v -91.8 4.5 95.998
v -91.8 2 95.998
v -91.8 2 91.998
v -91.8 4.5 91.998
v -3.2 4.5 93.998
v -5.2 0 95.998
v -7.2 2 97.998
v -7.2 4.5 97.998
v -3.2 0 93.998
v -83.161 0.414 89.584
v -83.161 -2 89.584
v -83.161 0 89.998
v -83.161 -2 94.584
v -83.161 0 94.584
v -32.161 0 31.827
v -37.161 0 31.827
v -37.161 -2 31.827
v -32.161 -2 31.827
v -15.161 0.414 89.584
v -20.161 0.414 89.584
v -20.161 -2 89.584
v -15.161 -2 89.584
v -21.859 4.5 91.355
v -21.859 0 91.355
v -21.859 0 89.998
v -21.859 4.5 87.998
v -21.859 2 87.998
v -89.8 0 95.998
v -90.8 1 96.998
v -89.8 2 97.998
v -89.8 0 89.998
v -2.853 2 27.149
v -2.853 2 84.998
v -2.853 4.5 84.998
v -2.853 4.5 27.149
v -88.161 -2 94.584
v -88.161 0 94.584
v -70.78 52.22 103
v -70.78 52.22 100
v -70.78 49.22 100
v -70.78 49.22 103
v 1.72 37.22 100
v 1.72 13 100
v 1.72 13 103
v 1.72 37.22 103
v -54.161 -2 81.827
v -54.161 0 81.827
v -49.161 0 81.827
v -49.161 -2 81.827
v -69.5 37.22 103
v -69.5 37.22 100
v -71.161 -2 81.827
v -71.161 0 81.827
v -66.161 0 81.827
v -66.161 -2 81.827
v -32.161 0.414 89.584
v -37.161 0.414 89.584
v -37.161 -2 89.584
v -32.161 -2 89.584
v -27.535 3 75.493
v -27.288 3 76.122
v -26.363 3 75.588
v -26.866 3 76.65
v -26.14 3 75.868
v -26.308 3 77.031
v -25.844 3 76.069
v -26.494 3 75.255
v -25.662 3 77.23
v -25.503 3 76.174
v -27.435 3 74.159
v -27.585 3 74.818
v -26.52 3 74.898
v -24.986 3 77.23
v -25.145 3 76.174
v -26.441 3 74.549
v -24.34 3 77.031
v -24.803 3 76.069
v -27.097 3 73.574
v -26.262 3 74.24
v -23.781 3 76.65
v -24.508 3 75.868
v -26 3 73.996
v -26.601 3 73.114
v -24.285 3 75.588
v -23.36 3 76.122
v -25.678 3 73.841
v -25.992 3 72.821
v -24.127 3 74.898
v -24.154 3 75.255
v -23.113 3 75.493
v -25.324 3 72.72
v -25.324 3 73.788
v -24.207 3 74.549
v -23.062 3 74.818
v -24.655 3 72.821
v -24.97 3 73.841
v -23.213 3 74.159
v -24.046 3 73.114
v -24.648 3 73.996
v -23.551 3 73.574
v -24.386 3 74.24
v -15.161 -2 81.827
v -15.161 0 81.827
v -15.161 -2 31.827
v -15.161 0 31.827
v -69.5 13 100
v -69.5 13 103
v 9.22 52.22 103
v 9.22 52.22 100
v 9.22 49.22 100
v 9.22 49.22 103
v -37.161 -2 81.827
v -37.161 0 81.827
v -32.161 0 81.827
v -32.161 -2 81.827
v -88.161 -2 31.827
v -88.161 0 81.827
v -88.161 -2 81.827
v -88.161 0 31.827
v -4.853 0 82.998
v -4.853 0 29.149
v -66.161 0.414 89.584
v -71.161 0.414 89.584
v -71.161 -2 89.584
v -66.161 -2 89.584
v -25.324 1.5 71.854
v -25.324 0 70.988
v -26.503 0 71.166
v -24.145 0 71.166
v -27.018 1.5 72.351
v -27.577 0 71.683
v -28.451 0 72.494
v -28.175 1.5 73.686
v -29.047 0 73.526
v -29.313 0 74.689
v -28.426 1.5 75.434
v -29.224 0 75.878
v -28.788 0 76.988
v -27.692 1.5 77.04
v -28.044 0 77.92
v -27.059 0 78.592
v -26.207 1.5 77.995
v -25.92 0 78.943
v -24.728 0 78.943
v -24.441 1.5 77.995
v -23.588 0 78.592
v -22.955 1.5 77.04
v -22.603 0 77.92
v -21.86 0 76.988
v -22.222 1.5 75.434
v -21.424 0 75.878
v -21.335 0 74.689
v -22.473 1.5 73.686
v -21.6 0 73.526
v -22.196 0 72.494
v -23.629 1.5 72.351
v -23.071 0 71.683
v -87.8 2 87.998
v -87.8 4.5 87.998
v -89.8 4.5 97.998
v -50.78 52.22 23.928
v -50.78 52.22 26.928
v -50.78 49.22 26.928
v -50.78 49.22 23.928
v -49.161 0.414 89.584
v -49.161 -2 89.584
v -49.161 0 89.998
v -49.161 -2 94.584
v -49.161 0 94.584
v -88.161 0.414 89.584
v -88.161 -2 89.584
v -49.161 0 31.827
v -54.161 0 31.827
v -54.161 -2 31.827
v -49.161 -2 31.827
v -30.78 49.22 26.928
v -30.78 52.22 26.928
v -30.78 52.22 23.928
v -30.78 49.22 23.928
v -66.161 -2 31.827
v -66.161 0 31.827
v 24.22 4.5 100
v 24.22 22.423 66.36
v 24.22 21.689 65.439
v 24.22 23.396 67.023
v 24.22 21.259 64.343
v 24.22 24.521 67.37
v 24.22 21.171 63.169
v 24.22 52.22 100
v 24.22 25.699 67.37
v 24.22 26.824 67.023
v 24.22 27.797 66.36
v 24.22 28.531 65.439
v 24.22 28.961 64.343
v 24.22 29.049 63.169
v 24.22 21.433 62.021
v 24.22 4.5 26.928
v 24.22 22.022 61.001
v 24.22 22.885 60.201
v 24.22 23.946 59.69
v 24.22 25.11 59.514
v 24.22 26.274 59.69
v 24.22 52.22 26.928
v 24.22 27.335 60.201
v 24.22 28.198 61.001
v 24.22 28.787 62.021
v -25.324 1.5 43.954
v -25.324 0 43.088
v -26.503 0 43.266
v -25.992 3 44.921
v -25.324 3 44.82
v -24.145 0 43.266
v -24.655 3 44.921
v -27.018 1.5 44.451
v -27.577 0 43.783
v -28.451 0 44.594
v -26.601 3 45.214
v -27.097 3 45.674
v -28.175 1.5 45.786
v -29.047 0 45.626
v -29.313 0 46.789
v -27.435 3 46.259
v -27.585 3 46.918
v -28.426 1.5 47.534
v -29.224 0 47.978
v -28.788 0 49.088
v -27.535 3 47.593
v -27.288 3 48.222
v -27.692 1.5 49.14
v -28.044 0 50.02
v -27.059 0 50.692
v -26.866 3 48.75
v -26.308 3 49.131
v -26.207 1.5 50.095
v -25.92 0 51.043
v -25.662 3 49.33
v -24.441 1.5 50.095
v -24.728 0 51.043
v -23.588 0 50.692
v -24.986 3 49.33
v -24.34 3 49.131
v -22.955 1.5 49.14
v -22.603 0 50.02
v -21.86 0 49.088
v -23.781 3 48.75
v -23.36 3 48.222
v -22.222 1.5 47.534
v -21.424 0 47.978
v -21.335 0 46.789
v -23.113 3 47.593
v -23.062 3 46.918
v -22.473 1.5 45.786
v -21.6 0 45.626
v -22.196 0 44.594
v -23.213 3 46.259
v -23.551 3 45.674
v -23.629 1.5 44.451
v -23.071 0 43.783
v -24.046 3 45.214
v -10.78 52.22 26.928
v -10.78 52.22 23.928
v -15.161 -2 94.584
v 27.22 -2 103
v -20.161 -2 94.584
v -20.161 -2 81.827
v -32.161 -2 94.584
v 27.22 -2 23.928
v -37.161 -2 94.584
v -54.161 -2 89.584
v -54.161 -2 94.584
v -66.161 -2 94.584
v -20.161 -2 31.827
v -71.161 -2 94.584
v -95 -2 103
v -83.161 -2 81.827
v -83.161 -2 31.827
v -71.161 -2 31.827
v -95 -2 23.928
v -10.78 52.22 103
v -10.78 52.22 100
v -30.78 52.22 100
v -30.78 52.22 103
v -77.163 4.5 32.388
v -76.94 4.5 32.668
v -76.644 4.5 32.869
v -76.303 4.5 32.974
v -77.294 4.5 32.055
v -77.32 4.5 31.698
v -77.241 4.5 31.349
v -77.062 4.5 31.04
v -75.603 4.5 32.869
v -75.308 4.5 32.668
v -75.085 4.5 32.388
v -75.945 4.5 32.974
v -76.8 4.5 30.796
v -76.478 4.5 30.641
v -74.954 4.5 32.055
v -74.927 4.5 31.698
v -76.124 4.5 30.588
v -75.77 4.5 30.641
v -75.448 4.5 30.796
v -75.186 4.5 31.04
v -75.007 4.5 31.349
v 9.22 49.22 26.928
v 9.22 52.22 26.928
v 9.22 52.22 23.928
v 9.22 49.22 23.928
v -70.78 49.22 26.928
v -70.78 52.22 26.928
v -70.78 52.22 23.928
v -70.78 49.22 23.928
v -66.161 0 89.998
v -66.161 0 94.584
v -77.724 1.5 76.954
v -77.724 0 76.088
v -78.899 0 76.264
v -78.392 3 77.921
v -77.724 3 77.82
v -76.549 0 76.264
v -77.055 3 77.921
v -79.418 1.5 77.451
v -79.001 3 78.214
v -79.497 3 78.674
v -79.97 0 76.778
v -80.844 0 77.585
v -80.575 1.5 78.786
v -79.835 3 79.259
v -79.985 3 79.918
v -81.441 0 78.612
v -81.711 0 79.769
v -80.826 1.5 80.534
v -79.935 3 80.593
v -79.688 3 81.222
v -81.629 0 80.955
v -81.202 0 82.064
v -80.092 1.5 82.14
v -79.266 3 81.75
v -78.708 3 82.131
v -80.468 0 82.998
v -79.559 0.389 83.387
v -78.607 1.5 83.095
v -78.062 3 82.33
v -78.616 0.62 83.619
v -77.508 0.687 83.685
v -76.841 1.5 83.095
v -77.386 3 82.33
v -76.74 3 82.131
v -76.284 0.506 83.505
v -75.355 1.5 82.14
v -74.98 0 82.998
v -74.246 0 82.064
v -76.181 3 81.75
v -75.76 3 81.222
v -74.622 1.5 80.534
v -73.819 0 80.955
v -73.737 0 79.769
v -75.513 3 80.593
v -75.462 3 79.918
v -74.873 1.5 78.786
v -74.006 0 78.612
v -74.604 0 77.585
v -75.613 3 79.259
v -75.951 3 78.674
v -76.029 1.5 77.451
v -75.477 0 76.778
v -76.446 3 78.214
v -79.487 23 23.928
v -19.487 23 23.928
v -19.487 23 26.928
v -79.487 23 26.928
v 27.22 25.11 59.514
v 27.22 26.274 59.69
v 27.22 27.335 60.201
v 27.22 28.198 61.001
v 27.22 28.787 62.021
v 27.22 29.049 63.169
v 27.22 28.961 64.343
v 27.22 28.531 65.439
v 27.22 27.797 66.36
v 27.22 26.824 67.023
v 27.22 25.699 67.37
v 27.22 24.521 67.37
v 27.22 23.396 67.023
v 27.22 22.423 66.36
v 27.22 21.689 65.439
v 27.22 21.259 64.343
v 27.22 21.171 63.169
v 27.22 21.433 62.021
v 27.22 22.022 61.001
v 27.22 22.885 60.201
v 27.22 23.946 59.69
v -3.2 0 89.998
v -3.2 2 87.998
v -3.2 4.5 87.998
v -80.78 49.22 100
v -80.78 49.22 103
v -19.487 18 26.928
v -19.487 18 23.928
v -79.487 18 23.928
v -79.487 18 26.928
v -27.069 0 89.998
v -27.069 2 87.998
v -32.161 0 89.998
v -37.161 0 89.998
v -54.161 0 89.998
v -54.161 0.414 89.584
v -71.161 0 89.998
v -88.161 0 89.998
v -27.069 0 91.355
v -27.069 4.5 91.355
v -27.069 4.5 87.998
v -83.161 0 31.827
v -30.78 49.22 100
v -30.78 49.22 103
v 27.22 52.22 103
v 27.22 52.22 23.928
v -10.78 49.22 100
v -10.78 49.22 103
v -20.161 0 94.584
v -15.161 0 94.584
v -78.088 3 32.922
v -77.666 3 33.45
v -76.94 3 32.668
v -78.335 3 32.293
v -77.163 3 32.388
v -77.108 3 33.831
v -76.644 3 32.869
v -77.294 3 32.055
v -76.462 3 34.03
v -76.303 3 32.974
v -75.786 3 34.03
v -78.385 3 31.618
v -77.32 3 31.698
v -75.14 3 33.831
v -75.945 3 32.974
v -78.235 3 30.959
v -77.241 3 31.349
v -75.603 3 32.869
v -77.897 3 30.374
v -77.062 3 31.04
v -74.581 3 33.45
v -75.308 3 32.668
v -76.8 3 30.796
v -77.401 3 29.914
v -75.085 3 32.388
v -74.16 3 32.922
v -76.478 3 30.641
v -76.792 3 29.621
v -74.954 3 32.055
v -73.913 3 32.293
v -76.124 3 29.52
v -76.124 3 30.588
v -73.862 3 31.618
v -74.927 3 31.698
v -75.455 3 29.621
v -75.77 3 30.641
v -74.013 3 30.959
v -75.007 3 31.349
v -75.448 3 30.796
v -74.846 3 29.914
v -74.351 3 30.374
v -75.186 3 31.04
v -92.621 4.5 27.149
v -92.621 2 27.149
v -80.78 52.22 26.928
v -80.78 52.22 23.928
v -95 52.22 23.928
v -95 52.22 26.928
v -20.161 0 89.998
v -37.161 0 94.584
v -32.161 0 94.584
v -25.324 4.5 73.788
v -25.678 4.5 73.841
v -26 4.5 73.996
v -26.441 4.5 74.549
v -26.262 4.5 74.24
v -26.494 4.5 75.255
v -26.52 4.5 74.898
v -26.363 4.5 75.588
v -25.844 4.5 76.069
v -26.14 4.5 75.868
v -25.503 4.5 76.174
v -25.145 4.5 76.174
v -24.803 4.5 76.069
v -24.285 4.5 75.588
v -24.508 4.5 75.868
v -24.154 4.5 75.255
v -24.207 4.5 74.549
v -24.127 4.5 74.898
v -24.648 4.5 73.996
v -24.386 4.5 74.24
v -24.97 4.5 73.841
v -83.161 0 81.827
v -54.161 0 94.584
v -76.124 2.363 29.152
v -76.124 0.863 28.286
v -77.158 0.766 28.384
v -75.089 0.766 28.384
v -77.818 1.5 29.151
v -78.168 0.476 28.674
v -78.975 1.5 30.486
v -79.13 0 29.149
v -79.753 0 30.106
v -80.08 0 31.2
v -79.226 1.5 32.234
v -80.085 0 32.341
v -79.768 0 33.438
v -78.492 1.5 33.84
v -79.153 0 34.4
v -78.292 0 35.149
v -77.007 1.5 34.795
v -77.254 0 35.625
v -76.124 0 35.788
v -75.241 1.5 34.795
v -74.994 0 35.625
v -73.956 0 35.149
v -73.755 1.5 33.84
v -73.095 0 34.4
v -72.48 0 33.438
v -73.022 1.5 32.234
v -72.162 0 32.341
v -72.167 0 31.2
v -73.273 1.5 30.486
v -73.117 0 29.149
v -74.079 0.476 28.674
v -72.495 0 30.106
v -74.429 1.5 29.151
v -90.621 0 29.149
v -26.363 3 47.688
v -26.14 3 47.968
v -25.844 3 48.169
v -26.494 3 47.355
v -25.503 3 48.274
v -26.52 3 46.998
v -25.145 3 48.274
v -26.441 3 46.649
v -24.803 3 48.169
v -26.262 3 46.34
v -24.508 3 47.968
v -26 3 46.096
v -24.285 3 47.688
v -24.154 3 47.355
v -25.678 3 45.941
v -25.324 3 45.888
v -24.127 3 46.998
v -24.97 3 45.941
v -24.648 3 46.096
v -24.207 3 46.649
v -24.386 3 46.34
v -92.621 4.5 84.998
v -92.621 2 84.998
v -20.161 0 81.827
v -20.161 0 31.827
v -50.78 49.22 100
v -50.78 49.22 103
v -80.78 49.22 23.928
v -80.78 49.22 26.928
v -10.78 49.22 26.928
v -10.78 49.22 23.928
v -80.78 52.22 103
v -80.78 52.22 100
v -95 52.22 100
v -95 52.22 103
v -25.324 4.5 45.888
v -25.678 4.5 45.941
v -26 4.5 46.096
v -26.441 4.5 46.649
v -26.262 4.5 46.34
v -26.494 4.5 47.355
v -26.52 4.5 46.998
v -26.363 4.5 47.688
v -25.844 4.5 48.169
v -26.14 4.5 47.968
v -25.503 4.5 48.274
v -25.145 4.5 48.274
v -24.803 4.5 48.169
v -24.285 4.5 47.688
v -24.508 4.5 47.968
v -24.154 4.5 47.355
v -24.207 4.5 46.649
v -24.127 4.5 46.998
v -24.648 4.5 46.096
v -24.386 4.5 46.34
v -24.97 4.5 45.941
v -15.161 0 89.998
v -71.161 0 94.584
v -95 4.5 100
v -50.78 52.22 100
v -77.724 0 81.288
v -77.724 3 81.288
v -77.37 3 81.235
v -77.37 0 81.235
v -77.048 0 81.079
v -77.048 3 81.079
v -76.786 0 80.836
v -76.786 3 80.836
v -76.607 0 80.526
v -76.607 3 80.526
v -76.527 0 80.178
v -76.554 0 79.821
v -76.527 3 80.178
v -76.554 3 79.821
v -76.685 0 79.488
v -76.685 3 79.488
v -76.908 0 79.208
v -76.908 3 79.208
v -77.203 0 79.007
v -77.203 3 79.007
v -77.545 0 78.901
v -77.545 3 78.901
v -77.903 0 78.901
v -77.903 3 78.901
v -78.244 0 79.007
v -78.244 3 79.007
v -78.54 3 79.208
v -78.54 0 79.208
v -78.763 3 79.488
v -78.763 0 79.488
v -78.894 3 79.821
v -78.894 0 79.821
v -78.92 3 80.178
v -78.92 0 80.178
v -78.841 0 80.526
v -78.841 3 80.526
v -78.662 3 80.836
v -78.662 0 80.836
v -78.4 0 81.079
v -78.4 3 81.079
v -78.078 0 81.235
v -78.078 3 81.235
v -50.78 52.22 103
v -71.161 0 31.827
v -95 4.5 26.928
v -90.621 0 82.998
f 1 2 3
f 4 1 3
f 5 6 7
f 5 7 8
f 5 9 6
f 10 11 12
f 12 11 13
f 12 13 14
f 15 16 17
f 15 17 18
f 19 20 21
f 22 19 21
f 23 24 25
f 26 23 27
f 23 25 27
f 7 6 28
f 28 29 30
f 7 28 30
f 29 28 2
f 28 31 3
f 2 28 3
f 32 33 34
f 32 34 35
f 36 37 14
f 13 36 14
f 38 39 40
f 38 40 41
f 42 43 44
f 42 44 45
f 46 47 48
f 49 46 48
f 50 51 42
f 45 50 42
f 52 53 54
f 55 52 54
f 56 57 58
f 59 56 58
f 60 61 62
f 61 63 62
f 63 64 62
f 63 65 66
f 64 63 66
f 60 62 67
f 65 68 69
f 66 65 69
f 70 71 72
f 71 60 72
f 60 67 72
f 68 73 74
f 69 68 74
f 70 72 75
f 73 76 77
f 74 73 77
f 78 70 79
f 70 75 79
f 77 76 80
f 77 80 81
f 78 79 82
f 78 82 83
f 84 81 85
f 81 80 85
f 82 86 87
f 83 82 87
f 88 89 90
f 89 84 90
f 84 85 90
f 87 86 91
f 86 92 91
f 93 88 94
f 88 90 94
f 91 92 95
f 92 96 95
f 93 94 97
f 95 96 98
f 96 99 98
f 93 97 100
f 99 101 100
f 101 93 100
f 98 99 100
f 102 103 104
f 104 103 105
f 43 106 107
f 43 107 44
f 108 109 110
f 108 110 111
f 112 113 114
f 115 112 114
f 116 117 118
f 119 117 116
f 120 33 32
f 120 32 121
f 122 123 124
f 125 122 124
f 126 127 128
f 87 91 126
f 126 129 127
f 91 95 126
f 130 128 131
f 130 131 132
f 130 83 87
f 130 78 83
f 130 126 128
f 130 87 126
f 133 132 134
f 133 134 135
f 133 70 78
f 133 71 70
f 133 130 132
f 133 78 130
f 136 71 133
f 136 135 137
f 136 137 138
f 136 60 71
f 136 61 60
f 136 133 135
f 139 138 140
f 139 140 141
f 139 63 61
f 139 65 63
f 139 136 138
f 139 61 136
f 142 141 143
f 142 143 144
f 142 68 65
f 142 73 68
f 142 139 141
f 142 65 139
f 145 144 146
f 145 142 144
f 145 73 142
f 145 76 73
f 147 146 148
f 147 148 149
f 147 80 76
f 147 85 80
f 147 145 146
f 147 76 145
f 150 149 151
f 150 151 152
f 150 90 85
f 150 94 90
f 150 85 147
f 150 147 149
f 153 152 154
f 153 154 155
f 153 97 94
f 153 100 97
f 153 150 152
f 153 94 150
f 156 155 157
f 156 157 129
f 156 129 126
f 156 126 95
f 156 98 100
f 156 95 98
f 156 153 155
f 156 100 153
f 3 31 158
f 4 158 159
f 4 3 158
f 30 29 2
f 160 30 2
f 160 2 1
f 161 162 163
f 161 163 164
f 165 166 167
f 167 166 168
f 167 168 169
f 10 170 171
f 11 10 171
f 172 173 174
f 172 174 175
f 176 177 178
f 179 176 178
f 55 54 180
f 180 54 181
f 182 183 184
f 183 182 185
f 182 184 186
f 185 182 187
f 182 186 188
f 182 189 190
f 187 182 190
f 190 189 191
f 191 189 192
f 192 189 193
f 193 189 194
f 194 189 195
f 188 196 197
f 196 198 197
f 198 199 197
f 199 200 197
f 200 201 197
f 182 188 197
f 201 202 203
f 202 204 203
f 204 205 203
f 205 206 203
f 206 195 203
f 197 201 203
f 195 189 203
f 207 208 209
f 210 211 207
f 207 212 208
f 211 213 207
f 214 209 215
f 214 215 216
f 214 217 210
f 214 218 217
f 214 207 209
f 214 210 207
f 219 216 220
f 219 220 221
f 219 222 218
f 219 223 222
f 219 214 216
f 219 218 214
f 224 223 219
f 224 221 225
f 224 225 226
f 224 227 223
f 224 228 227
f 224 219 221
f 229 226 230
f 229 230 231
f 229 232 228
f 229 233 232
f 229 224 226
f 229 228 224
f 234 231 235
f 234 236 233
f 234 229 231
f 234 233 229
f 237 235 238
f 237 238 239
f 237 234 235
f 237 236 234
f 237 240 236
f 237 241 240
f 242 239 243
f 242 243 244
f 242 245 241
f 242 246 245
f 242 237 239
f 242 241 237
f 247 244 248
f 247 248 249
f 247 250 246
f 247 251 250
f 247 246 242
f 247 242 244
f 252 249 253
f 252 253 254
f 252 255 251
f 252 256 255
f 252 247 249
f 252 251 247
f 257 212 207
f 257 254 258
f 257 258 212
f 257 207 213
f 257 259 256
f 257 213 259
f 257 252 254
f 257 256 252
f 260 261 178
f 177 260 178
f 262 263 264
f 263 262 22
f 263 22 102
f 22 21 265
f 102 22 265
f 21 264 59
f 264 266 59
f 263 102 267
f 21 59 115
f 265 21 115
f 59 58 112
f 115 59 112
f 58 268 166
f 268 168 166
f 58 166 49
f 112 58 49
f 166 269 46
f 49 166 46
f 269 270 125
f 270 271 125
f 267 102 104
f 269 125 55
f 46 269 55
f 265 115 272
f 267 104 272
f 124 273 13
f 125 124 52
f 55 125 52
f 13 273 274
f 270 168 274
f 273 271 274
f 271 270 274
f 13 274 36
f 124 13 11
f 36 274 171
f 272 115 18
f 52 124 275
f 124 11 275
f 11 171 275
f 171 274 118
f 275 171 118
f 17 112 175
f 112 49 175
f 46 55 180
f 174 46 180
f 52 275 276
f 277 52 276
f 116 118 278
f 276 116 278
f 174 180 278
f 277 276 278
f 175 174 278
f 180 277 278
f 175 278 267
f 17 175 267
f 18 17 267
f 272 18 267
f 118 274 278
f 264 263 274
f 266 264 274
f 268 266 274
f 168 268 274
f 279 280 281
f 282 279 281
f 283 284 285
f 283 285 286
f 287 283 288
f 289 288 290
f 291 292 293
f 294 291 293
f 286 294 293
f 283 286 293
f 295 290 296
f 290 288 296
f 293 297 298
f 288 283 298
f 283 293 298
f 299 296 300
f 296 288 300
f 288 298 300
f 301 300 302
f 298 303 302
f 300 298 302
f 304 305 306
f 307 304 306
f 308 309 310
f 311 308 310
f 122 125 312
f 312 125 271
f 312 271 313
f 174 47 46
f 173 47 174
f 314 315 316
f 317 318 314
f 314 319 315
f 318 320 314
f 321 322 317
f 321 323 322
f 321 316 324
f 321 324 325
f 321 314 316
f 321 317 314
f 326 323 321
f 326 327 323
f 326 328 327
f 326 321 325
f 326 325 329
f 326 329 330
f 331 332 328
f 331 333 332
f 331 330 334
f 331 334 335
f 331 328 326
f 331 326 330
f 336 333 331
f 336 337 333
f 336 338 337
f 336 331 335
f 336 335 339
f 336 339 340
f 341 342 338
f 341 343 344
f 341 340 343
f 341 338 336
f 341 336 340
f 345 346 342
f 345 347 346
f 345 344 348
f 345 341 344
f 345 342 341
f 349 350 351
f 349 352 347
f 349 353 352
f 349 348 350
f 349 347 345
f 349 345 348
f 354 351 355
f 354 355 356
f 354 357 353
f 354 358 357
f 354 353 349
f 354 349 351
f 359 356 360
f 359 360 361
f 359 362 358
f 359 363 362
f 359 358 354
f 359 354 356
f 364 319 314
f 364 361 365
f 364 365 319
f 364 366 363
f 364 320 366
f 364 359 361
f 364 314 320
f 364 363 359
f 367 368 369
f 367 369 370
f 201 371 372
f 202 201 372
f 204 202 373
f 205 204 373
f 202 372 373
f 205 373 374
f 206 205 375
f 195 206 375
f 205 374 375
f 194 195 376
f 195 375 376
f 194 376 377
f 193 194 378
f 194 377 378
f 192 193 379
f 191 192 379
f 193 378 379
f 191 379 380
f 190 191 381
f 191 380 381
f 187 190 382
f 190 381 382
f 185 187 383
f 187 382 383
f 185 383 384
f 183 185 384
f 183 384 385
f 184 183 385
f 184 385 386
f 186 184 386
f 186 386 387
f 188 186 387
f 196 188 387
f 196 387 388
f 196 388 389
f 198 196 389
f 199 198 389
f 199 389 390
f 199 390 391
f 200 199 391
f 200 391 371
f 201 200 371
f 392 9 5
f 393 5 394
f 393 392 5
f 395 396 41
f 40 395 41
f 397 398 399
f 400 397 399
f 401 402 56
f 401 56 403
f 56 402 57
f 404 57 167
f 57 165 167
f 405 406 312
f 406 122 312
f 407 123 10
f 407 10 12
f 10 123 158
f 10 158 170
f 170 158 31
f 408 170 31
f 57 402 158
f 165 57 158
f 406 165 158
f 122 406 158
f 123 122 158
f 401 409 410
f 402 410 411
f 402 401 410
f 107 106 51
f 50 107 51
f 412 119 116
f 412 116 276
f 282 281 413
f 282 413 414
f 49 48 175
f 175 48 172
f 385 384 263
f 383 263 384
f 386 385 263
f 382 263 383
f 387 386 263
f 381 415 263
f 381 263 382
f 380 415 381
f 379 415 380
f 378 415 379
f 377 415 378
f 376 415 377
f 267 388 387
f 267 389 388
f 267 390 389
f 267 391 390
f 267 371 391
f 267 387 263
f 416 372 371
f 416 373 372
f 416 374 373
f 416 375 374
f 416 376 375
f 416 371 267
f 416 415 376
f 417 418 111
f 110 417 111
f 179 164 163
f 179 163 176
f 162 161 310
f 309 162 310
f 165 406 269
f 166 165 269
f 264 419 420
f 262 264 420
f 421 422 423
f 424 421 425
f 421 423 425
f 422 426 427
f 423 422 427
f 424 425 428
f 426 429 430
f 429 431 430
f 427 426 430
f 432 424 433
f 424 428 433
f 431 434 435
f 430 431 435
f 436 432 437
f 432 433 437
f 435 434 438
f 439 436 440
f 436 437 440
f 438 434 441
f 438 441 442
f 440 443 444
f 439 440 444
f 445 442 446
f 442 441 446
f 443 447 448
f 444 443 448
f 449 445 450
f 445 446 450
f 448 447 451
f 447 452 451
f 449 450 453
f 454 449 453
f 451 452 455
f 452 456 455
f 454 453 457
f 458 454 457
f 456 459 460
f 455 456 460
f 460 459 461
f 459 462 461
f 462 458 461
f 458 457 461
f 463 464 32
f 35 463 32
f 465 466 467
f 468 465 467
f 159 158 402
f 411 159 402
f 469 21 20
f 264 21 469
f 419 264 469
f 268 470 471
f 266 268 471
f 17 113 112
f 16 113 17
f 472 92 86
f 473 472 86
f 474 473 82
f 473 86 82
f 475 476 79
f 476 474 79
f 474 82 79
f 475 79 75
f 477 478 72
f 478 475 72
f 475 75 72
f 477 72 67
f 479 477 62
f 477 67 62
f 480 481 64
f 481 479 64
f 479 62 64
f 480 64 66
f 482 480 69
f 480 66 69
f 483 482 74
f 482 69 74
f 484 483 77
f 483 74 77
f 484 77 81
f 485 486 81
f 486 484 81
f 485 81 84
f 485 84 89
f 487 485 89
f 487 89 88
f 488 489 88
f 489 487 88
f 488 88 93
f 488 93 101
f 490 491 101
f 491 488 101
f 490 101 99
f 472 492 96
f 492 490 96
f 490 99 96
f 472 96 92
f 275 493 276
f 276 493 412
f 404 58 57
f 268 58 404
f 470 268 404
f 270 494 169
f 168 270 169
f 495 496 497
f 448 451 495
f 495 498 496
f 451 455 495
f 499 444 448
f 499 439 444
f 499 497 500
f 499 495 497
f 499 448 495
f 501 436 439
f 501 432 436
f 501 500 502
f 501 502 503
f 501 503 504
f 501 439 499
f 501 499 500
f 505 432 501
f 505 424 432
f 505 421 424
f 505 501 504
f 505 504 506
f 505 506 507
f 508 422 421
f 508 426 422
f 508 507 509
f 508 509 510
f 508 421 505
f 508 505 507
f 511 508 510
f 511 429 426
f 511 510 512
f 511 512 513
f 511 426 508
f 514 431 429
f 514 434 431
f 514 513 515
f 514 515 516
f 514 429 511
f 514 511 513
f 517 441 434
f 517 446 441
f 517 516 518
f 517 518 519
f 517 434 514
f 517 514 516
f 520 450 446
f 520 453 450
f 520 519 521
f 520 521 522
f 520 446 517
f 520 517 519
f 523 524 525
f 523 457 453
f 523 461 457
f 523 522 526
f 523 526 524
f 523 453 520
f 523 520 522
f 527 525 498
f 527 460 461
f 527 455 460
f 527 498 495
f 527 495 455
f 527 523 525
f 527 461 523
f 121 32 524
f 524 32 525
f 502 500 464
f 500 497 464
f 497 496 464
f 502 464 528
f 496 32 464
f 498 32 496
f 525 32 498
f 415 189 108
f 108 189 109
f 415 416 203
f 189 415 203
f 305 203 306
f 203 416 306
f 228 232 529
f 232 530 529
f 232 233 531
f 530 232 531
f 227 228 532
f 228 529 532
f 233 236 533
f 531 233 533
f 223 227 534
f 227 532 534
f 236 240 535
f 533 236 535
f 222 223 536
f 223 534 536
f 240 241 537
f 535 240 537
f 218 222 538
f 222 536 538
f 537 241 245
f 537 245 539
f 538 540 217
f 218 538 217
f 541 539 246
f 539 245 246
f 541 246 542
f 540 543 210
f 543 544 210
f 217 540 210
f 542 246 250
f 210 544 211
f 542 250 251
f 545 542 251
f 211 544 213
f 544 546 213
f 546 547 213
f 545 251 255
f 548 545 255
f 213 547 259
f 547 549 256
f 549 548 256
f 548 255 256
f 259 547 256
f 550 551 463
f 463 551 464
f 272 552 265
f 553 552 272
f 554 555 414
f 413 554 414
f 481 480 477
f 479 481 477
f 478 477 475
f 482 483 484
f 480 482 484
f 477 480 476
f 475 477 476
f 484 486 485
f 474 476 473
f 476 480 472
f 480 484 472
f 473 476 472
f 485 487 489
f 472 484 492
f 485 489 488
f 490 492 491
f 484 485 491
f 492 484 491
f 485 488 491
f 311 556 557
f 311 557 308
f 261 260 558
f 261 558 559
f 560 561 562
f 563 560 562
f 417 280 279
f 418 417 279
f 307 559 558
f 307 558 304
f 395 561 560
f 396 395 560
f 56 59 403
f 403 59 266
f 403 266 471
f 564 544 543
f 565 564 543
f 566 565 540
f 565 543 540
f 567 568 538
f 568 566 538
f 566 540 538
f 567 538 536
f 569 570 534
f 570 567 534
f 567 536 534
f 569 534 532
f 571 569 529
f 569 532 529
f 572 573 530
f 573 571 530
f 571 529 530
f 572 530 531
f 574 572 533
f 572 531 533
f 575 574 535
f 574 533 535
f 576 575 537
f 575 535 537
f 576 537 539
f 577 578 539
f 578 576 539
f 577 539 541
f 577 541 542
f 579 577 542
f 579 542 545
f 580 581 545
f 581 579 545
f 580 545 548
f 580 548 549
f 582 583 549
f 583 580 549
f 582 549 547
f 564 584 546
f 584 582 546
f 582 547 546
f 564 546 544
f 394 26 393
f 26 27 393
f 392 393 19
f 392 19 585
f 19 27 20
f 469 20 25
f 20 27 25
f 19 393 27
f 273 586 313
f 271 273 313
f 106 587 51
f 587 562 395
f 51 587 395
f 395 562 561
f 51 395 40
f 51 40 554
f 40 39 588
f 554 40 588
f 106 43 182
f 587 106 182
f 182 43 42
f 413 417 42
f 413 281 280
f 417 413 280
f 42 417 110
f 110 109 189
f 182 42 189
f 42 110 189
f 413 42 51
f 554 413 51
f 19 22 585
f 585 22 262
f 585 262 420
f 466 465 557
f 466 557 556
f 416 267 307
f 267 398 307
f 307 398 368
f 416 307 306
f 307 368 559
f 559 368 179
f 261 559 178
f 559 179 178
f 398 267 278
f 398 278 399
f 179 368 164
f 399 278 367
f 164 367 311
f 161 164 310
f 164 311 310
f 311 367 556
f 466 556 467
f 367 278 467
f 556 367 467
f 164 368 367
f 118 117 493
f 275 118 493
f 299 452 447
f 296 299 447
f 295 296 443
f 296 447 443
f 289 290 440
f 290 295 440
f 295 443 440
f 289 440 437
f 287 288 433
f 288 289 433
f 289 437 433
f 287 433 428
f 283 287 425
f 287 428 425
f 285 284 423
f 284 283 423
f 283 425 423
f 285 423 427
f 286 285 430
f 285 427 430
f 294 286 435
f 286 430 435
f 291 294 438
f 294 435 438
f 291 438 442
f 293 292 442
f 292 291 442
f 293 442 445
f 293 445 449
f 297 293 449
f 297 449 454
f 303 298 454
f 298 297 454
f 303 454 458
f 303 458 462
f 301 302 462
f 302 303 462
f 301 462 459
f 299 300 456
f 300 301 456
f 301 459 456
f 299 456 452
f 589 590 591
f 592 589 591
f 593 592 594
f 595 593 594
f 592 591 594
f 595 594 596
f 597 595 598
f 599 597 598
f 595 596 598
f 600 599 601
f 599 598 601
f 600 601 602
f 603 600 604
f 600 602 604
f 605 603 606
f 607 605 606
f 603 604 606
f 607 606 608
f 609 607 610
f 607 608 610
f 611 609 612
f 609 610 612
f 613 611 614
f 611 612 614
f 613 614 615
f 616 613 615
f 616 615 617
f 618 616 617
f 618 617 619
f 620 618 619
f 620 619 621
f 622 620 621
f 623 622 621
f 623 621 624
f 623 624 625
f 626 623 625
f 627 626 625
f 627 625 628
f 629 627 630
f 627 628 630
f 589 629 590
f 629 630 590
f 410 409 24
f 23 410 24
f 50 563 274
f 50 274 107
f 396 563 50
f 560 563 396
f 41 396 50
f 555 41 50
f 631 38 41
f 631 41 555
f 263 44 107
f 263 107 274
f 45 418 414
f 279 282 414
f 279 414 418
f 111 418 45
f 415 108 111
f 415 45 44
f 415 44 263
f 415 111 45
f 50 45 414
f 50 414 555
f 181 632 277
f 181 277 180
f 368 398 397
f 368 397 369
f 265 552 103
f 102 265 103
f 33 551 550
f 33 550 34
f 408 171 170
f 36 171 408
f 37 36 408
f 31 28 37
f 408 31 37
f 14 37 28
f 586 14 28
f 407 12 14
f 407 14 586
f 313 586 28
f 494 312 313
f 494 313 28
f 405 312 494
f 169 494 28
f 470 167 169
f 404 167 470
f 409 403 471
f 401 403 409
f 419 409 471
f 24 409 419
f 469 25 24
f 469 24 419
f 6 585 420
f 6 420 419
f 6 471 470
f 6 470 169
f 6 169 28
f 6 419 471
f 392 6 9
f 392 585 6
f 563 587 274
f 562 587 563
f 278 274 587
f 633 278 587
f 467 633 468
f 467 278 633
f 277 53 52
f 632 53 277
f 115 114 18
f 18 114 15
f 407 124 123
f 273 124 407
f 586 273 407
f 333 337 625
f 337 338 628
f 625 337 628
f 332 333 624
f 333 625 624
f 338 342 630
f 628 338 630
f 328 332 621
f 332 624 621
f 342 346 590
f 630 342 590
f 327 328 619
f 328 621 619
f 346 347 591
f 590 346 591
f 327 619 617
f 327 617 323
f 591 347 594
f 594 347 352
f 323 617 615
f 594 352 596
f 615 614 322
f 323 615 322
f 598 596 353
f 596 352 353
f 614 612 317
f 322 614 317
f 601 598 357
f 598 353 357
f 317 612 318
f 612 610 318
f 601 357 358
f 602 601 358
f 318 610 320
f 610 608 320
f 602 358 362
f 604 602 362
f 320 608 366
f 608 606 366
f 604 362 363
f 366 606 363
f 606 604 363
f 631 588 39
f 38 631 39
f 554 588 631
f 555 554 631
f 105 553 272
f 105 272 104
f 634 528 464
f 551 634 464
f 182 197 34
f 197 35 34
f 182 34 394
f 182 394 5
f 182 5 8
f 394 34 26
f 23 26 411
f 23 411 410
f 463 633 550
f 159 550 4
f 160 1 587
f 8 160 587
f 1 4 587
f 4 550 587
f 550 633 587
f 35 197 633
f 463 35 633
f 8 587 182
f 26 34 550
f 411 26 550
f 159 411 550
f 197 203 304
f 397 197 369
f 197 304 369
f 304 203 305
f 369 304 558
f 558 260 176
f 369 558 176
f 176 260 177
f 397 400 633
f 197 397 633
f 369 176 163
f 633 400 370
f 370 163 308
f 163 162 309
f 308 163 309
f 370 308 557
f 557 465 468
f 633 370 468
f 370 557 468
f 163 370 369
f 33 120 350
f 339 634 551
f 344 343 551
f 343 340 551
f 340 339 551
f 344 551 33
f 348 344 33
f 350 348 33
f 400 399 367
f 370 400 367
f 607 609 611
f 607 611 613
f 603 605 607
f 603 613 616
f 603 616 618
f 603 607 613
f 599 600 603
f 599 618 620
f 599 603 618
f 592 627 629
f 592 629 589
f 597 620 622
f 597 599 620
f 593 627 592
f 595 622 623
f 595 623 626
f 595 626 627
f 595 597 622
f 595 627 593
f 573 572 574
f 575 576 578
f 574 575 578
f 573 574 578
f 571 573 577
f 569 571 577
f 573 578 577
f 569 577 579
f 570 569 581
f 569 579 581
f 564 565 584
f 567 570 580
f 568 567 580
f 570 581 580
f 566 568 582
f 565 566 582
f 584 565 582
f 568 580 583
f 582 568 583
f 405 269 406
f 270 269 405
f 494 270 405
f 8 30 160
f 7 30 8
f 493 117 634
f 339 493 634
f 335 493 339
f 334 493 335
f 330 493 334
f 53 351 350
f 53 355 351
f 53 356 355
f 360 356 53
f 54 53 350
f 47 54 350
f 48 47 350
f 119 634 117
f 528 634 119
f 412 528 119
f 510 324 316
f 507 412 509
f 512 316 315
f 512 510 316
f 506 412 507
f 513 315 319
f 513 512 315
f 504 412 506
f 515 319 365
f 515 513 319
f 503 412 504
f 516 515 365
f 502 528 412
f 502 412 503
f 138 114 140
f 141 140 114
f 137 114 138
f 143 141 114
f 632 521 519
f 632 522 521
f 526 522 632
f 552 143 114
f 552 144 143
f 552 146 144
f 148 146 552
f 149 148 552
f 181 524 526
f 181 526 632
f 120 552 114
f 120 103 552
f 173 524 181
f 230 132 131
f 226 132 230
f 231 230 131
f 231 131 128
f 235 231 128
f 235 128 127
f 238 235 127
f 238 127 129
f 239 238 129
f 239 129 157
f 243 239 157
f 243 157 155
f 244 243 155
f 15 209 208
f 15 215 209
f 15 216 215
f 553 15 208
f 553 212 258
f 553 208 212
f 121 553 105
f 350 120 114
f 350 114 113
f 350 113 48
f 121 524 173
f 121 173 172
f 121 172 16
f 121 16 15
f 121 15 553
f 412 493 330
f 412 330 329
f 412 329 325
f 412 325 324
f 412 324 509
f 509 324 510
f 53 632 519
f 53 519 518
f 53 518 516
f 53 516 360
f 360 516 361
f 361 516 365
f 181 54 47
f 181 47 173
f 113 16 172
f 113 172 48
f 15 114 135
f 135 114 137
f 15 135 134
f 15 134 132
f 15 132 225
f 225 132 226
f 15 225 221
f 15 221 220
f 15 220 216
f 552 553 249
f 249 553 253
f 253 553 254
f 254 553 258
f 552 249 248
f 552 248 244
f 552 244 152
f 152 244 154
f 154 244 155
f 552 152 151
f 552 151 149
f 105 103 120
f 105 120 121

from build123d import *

# Parameters (mm, degrees)
SKETCH_1_W              = 95
SKETCH_1_H              = 100
EXTRUDE_1_DEPTH         = 2
SKETCH_3_R              = 1.2
EXTRUDE_2_DEPTH         = 7
SKETCH_4_R              = 2
EXTRUDE_3_DEPTH         = 3
CHAMFER_1_SIZE          = 2
CHAMFER_1_SIZE_2        = 3.464101615
SKETCH_5_W              = 88.6
SKETCH_5_H              = 22
SKETCH_5_H_2            = 10
EXTRUDE_4_DEPTH         = 50
SKETCH_8_W              = 2.378668295
SKETCH_8_H              = 57.848959614
SKETCH_8_W_2            = 2.852804632
EXTRUDE_6_DEPTH         = 4.5
SKETCH_7_W              = 5
SKETCH_7_H              = 50
SKETCH_7_H_2            = 9
SKETCH_7_H_3            = 5
CUT_EXTRUDE_1_DEPTH     = 4
CHAMFER_START           = -83.16108201
CHAMFER_2_DEPTH         = 12
CHAMFER_START_2         = -66.16108201
CHAMFER_2_2_DEPTH       = 12
CHAMFER_START_3         = -49.16108201
CHAMFER_2_3_DEPTH       = 12
CHAMFER_START_4         = -32.16108201
CHAMFER_2_4_DEPTH       = 12
CHAMFER_START_5         = -15.16108201
CHAMFER_2_5_DEPTH       = 12.308277378
CHAMFER_START_6         = -92.621331705
CHAMFER_2_6_DEPTH       = 4.460249695
CHAMFER_2_7_DEPTH       = 89.768527073
CHAMFER_START_7         = 1
CHAMFER_2_8_DEPTH       = 86.998233291
CHAMFER_2_9_DEPTH       = 26.149273677
CHAMFER_START_8         = 84.998233291
CHAMFER_2_10_DEPTH      = 14.001766709
SKETCH_13_W             = 5.505876785
SKETCH_13_H             = 3
CUT_EXTRUDE_6_DEPTH     = 10
SKETCH_17_W             = 2
SKETCH_17_H             = 2
SKETCH_17_W_2           = 0.768088879
EXTRUDE_9_DEPTH         = 20
CHAMFER_3_SIZE          = 2
CHAMFER_3_SIZE_2        = 3.464101615
CHAMFER_6_SIZE          = 4
SKETCH_18_W             = 4.206221656
SKETCH_18_H             = 3.021554381
SKETCH_18_W_2           = 5.210107228
SKETCH_18_H_2           = 3.356992826
EXTRUDE_11_DEPTH        = 50
FILLET_2_R              = 2
SKETCH_20_W             = 2.378668295
SKETCH_20_H             = 7.010495323
EXTRUDE_13_DEPTH        = 30
SKETCH_21_W             = 2.378668295
SKETCH_21_H             = 4.566526532
EXTRUDE_14_DEPTH        = 12
SKETCH_22_R             = 1.2
CUT_EXTRUDE_7_DEPTH     = 3
SKETCH_24_W             = 14.181336584
SKETCH_24_H             = 31.500920509
CUT_EXTRUDE_8_DEPTH     = 1
CHAMFER_7_SIZE          = 2
CORTAR_EXTRUIR1_DEPTH   = 147.714007511
CROQUIS4_W              = 122.22
CROQUIS4_H              = 54.22
CROQUIS4_W_2            = 71.22
CROQUIS4_H_2            = 24.22
SALIENTE_EXTRUIR2_DEPTH = 3
CROQUIS5_W              = 100
CROQUIS5_H              = 6.5
SALIENTE_EXTRUIR3_DEPTH = 27.22
CROQUIS10_W             = 122.22
CROQUIS10_H             = 23.928408898
CORTAR_EXTRUIR2_DEPTH   = 149.024316921
SALIENTE_EXTRUIR4_REACH = 170.148
CROQUIS13_W             = 1.988266343
CROQUIS13_H             = 6.5
CROQUIS14_W             = 122.22
CROQUIS14_H             = 54.22
SALIENTE_EXTRUIR5_DEPTH = 3
CROQUIS15_W             = 79.071591102
CROQUIS15_H             = 54.22
SALIENTE_EXTRUIR6_DEPTH = 3
CROQUIS16_R             = 3.95
CORTAR_EXTRUIR3_DEPTH   = 169.147723148
CROQUIS18_W             = 10
CROQUIS18_H             = 3
CROQUIS18_W_2           = 20
CORTAR_EXTRUIR4_DEPTH   = 3
CROQUIS23_W             = 60
CROQUIS23_H             = 5
CORTAR_EXTRUIR5_DEPTH   = 3


with BuildPart() as part:
    # Эскиз1 → Бобышка-Вытянуть1 (new body)
    with BuildSketch(Plane(origin=(0, 0, 0), x_dir=(1, 0, 0), z_dir=(0, 1, 0))):
        with Locations((-47.5, -50)):
            Rectangle(SKETCH_1_W, SKETCH_1_H)
    extrude(amount=-EXTRUDE_1_DEPTH)

    # Эскиз3 → Бобышка-Вытянуть2 (add)
    with BuildSketch(Plane(origin=(0, 0, 0), x_dir=(1, 0, 0), z_dir=(0, 1, 0))):
        with Locations(Location((-76.12379646, -31.787862309, 0), (0, 0, 90))):
            Circle(SKETCH_3_R)
        with Locations(Location((-25.32379646, -47.087862309, 0), (0, 0, 90))):
            Circle(SKETCH_3_R)
        with Locations(Location((-25.32379646, -74.987862309, 0), (0, 0, 90))):
            Circle(SKETCH_3_R)
    extrude(amount=EXTRUDE_2_DEPTH)

    # Эскиз4 → Бобышка-Вытянуть3 (add)
    with BuildSketch(Plane(origin=(0, 0, 0), x_dir=(1, 0, 0), z_dir=(0, 1, 0))):
        with Locations(Location((-76.12379646, -31.787862309, 0), (0, 0, 90))):
            Circle(SKETCH_4_R)
        with Locations(Location((-25.32379646, -47.087862309, 0), (0, 0, 90))):
            Circle(SKETCH_4_R)
        with Locations(Location((-25.32379646, -74.987862309, 0), (0, 0, 90))):
            Circle(SKETCH_4_R)
        with Locations(Location((-77.72379646, -80.087862309, 0), (0, 0, 90))):
            Circle(SKETCH_4_R)
    extrude(amount=EXTRUDE_3_DEPTH)

    # Фаска1
    # the kernel refuses this chamfer: 3.464101615, 2 mm, written as the material it adds along each edge
    with BuildSketch(Plane(origin=(-25.32379646, 0, 47.087862309), x_dir=(0, 0, -1), z_dir=(1, 0, 0))) as chamfer_1_piece_1_section:
        Polygon((2 + CHAMFER_1_SIZE, 0), (2, CHAMFER_1_SIZE_2), (2, 0), align=None)
    chamfer_1_piece_1 = revolve(axis=Axis((-25.32379646, 0, 47.087862309), (0, 1, 0)), mode=Mode.PRIVATE)
    chamfer_1_piece_1 = split(chamfer_1_piece_1, bisect_by=Plane(origin=(-25.32379646, 3, 47.087862309), z_dir=(0, -1, 0)), keep=Keep.TOP, mode=Mode.PRIVATE)
    add(chamfer_1_piece_1)
    with BuildSketch(Plane(origin=(-76.12379646, 0, 31.787862309), x_dir=(0, 0, -1), z_dir=(1, 0, 0))) as chamfer_1_piece_2_section:
        Polygon((2 + CHAMFER_1_SIZE, 0), (2, CHAMFER_1_SIZE_2), (2, 0), align=None)
    chamfer_1_piece_2 = revolve(axis=Axis((-76.12379646, 0, 31.787862309), (0, 1, 0)), mode=Mode.PRIVATE)
    chamfer_1_piece_2 = split(chamfer_1_piece_2, bisect_by=Plane(origin=(-76.12379646, 3, 31.787862309), z_dir=(0, -1, 0)), keep=Keep.TOP, mode=Mode.PRIVATE)
    add(chamfer_1_piece_2)
    with BuildSketch(Plane(origin=(-77.72379646, 0, 80.087862309), x_dir=(0, 0, -1), z_dir=(1, 0, 0))) as chamfer_1_piece_3_section:
        Polygon((2 + CHAMFER_1_SIZE, 0), (2, CHAMFER_1_SIZE_2), (2, 0), align=None)
    chamfer_1_piece_3 = revolve(axis=Axis((-77.72379646, 0, 80.087862309), (0, 1, 0)), mode=Mode.PRIVATE)
    chamfer_1_piece_3 = split(chamfer_1_piece_3, bisect_by=Plane(origin=(-77.72379646, 3, 80.087862309), z_dir=(0, -1, 0)), keep=Keep.TOP, mode=Mode.PRIVATE)
    add(chamfer_1_piece_3)
    with BuildSketch(Plane(origin=(-25.32379646, 0, 74.987862309), x_dir=(0, 0, -1), z_dir=(1, 0, 0))) as chamfer_1_piece_4_section:
        Polygon((2 + CHAMFER_1_SIZE, 0), (2, CHAMFER_1_SIZE_2), (2, 0), align=None)
    chamfer_1_piece_4 = revolve(axis=Axis((-25.32379646, 0, 74.987862309), (0, 1, 0)), mode=Mode.PRIVATE)
    chamfer_1_piece_4 = split(chamfer_1_piece_4, bisect_by=Plane(origin=(-25.32379646, 3, 74.987862309), z_dir=(0, -1, 0)), keep=Keep.TOP, mode=Mode.PRIVATE)
    add(chamfer_1_piece_4)

    # Эскиз5 → Бобышка-Вытянуть4 (add)
    # profile 1 of 2: a face of its own
    with BuildSketch(Plane(origin=(0, 0, 0), x_dir=(1, 0, 0), z_dir=(0, 1, 0))):
        Polygon((0, 0), (-95, 0), (-95, -3), (-95, -24.149273677), (-95, -27.149273677), (0, -27.149273677), (0, -24.149273677), (0, -3), align=None)
        with Locations((-47.5, -13.149273677)):
            Rectangle(SKETCH_5_W, SKETCH_5_H, mode=Mode.SUBTRACT)
    # profile 2 of 2: a face of its own
    with BuildSketch(Plane(origin=(0, 0, 0), x_dir=(1, 0, 0), z_dir=(0, 1, 0))):
        Polygon((0, -100), (-95, -100), (-95, -97), (-95, -87.998233291), (-95, -84.998233291), (0, -84.998233291), (0, -87.998233291), (0, -97), align=None)
        with Locations((-47.5, -92.998233291)):
            Rectangle(SKETCH_5_W, SKETCH_5_H_2, mode=Mode.SUBTRACT)
    extrude(amount=EXTRUDE_4_DEPTH)

    # Эскиз8 → Бобышка-Вытянуть6 (add)
    with BuildSketch(Plane(origin=(0, 0, 0), x_dir=(1, 0, 0), z_dir=(0, 1, 0))):
        with Locations((-93.810665852, -56.073753484)):
            Rectangle(SKETCH_8_W, SKETCH_8_H)
        with Locations((-1.426402316, -56.073753484)):
            Rectangle(SKETCH_8_W_2, SKETCH_8_H)
    extrude(amount=EXTRUDE_6_DEPTH)

    # Эскиз7 → Вырез-Вытянуть1 (cut)
    with BuildSketch(Plane(origin=(0, 0, 0), x_dir=(1, 0, 0), z_dir=(0, 1, 0))):
        with Locations((-68.66108201, -56.826653613)):
            Rectangle(SKETCH_7_W, SKETCH_7_H)
        with Locations((-85.66108201, -56.826653613)):
            Rectangle(SKETCH_7_W, SKETCH_7_H)
        with Locations((-68.66108201, -10.718973477)):
            Rectangle(SKETCH_7_W, SKETCH_7_H_2)
        with Locations((-85.66108201, -10.718973477)):
            Rectangle(SKETCH_7_W, SKETCH_7_H_2)
        with Locations((-85.66108201, -92.084172994)):
            Rectangle(SKETCH_7_W, SKETCH_7_H_3)
        with Locations((-51.66108201, -56.826653613)):
            Rectangle(SKETCH_7_W, SKETCH_7_H)
        with Locations((-34.66108201, -56.826653613)):
            Rectangle(SKETCH_7_W, SKETCH_7_H)
        with Locations((-17.66108201, -56.826653613)):
            Rectangle(SKETCH_7_W, SKETCH_7_H)
        with Locations((-68.66108201, -92.084172994)):
            Rectangle(SKETCH_7_W, SKETCH_7_H_3)
        with Locations((-51.66108201, -10.718973477)):
            Rectangle(SKETCH_7_W, SKETCH_7_H_2)
        with Locations((-51.66108201, -92.084172994)):
            Rectangle(SKETCH_7_W, SKETCH_7_H_3)
        with Locations((-34.66108201, -10.718973477)):
            Rectangle(SKETCH_7_W, SKETCH_7_H_2)
        with Locations((-34.66108201, -92.084172994)):
            Rectangle(SKETCH_7_W, SKETCH_7_H_3)
        with Locations((-17.66108201, -10.718973477)):
            Rectangle(SKETCH_7_W, SKETCH_7_H_2)
        with Locations((-17.66108201, -92.084172994)):
            Rectangle(SKETCH_7_W, SKETCH_7_H_3)
    extrude(amount=-CUT_EXTRUDE_1_DEPTH, mode=Mode.SUBTRACT)

    # Фаска2: read off the stored shape, not the designer's step
    # Фаска2 outline → Фаска2 (add)
    with BuildSketch(Plane.YZ.offset(CHAMFER_START)):
        Polygon((0, 89.998233291), (0, 89.584172994), (0.414060297, 89.584172994), align=None)
    extrude(amount=CHAMFER_2_DEPTH)

    # Chamfer 2 2 outline → Chamfer 2 2 (add)
    with BuildSketch(Plane.YZ.offset(CHAMFER_START_2)):
        Polygon((0, 89.998233291), (0, 89.584172994), (0.414060297, 89.584172994), align=None)
    extrude(amount=CHAMFER_2_2_DEPTH)

    # Chamfer 2 3 outline → Chamfer 2 3 (add)
    with BuildSketch(Plane.YZ.offset(CHAMFER_START_3)):
        Polygon((0, 89.998233291), (0, 89.584172994), (0.414060297, 89.584172994), align=None)
    extrude(amount=CHAMFER_2_3_DEPTH)

    # Chamfer 2 4 outline → Chamfer 2 4 (add)
    with BuildSketch(Plane.YZ.offset(CHAMFER_START_4)):
        Polygon((0, 89.998233291), (0, 89.584172994), (0.414060297, 89.584172994), align=None)
    extrude(amount=CHAMFER_2_4_DEPTH)

    # Chamfer 2 5 outline → Chamfer 2 5 (add)
    with BuildSketch(Plane.YZ.offset(CHAMFER_START_5)):
        Polygon((0, 89.998233291), (0, 89.584172994), (0.414060297, 89.584172994), align=None)
    extrude(amount=CHAMFER_2_5_DEPTH)

    # Chamfer 2 6 outline → Chamfer 2 6 (add)
    with BuildSketch(Plane.YZ.offset(CHAMFER_START_6)):
        Polygon((0, 89.998233291), (0, 89.584172994), (0.414060297, 89.584172994), align=None)
    extrude(amount=CHAMFER_2_6_DEPTH)

    # Chamfer 2 7 outline → Chamfer 2 7 (add)
    with BuildSketch(Plane.YZ.offset(CHAMFER_START_6)):
        Polygon((0, 97.998233291), (0, 95.998233291), (2, 97.998233291), align=None)
        Polygon((0.414060297, 89.584172994), (0, 89.584172994), (0, 87.998233291), (2, 87.998233291), align=None)
        Polygon((0, 24.149273677), (0, 22.149273677), (2, 24.149273677), align=None)
        Polygon((2, 2.149273677), (0, 4.149273677), (0, 2.149273677), align=None)
        Polygon((0, 27.149273677), (2, 27.149273677), (0, 29.149273677), align=None)
        Polygon((0, 84.998233291), (0, 82.998233291), (2, 84.998233291), align=None)
    extrude(amount=CHAMFER_2_7_DEPTH)

    # Chamfer 2 8 outline → Chamfer 2 8 (add)
    with BuildSketch(Plane.XY.offset(CHAMFER_START_7)):
        Polygon((-92.621331705, 0), (-90.621331705, 0), (-92.621331705, 2), align=None)
        Polygon((-4.852804632, 0), (-2.852804632, 0), (-2.852804632, 2), align=None)
    extrude(amount=CHAMFER_2_8_DEPTH)

    # Chamfer 2 9 outline → Chamfer 2 9 (add)
    with BuildSketch(Plane.XY.offset(CHAMFER_START_7)):
        Polygon((-3.2, 2), (-5.2, 0), (-4.852804632, 0), (-3.2, 1.652804632), align=None)
        Polygon((-89.8, 0), (-91.8, 2), (-91.8, 1.178668295), (-90.621331705, 0), align=None)
    extrude(amount=CHAMFER_2_9_DEPTH)

    # Chamfer 2 10 outline → Chamfer 2 10 (add)
    with BuildSketch(Plane.XY.offset(CHAMFER_START_8)):
        Polygon((-89.8, 0), (-91.8, 2), (-91.8, 0), align=None)
    extrude(amount=CHAMFER_2_10_DEPTH)

    # Эскиз13 → Вырез-Вытянуть6 (cut)
    with BuildSketch(Plane(origin=(0, 50, 0), x_dir=(1, 0, 0), z_dir=(0, 1, 0))):
        with Locations((-13.994725416, -25.649273677)):
            Rectangle(SKETCH_13_W, SKETCH_13_H)
        with Locations((-13.994725416, -86.498233291)):
            Rectangle(SKETCH_13_W, SKETCH_13_H)
    extrude(amount=-CUT_EXTRUDE_6_DEPTH, mode=Mode.SUBTRACT)

    # Эскиз17 → Бобышка-Вытянуть9 (add)
    with BuildSketch(Plane(origin=(0, 50, 0), x_dir=(1, 0, 0), z_dir=(0, 1, 0))):
        with Locations((-91.621331705, -28.149273677)):
            Rectangle(SKETCH_17_W, SKETCH_17_H)
        with Locations((-91.621331705, -83.998233291)):
            Rectangle(SKETCH_17_W, SKETCH_17_H)
        with Locations((-5.236849072, -83.998233291)):
            Rectangle(SKETCH_17_W_2, SKETCH_17_H)
        with Locations((-3.852804632, -28.149273677)):
            Rectangle(SKETCH_17_W, SKETCH_17_H)
    extrude(amount=-EXTRUDE_9_DEPTH)

    # Фаска3
    # the kernel refuses this chamfer: 3.464101615, 2 mm, written as the material it adds along each edge
    with BuildSketch(Plane(origin=(-5.620893511, 30, 84.998233291), x_dir=(0, -1, 0), z_dir=(1, 0, 0))) as chamfer_3_piece_1_section:
        Polygon((CHAMFER_3_SIZE, 0), (0, CHAMFER_3_SIZE_2), (0, 0), align=None)
    chamfer_3_piece_1 = extrude(amount=0.768088879, mode=Mode.PRIVATE)
    chamfer_3_piece_1 = split(chamfer_3_piece_1, bisect_by=Plane(origin=(-5.620893511, 30, 82.998233291), z_dir=(0, 0, 1)), keep=Keep.TOP, mode=Mode.PRIVATE)
    add(chamfer_3_piece_1)
    with BuildSketch(Plane(origin=(-92.621331705, 30, 84.998233291), x_dir=(0, -1, 0), z_dir=(1, 0, 0))) as chamfer_3_piece_2_section:
        Polygon((CHAMFER_3_SIZE_2, 0), (0, CHAMFER_3_SIZE), (0, 0), align=None)
    chamfer_3_piece_2 = extrude(amount=2, mode=Mode.PRIVATE)
    chamfer_3_piece_2 = split(chamfer_3_piece_2, bisect_by=Plane(origin=(-92.621331705, 30, 82.998233291), z_dir=(0, 0, 1)), keep=Keep.TOP, mode=Mode.PRIVATE)
    add(chamfer_3_piece_2)
    with BuildSketch(Plane(origin=(-92.621331705, 30, 27.149273677), x_dir=(0, -1, 0), z_dir=(1, 0, 0))) as chamfer_3_piece_3_section:
        Polygon((CHAMFER_3_SIZE_2, 0), (0, -CHAMFER_3_SIZE), (0, 0), align=None)
    chamfer_3_piece_3 = extrude(amount=2, mode=Mode.PRIVATE)
    chamfer_3_piece_3 = split(chamfer_3_piece_3, bisect_by=Plane(origin=(-92.621331705, 30, 29.149273677), z_dir=(0, 0, -1)), keep=Keep.TOP, mode=Mode.PRIVATE)
    add(chamfer_3_piece_3)
    with BuildSketch(Plane(origin=(-2.852804632, 30, 27.149273677), x_dir=(0, -1, 0), z_dir=(-1, 0, 0))) as chamfer_3_piece_4_section:
        Polygon((CHAMFER_3_SIZE_2, 0), (0, CHAMFER_3_SIZE), (0, 0), align=None)
    chamfer_3_piece_4 = extrude(amount=2, mode=Mode.PRIVATE)
    chamfer_3_piece_4 = split(chamfer_3_piece_4, bisect_by=Plane(origin=(-2.852804632, 30, 29.149273677), z_dir=(0, 0, -1)), keep=Keep.TOP, mode=Mode.PRIVATE)
    add(chamfer_3_piece_4)

    # Фаска6
    chamfer_6_edges = [part.edges().sort_by_distance(p)[0] for p in [
        (-91.8, 26, 24.149273677),
        (-91.8, 26, 2.149273677),
        (-91.8, 26, 87.998233291),
        (-3.2, 26, 24.149273677),
        (-3.2, 26, 97.998233291),
        (-3.2, 26, 2.149273677),
    ]]
    chamfer(chamfer_6_edges, length=CHAMFER_6_SIZE - 0.0001)  # a hair under: the kernel refuses the full size

    # Эскиз18 → Бобышка-Вытянуть11 (add)
    with BuildSketch(Plane(origin=(0, 0, 0), x_dir=(1, 0, 0), z_dir=(0, 1, 0))):
        with Locations((-19.755724458, -22.638496487)):
            Rectangle(SKETCH_18_W, SKETCH_18_H)
        with Locations((-24.4638889, -89.676729704)):
            Rectangle(SKETCH_18_W_2, SKETCH_18_H_2)
    extrude(amount=EXTRUDE_11_DEPTH)

    # Скругление2
    fillet_2_edges = [part.edges().sort_by_distance(p)[0] for p in [
        (-16.747663808, 40, 25.649273677),
        (-11.241787023, 40, 25.649273677),
        (-11.241787023, 40, 86.498233291),
        (-16.747663808, 40, 86.498233291),
    ]]
    fillet(fillet_2_edges, radius=FILLET_2_R)

    # Эскиз20 → Бобышка-Вытянуть13 (add)
    with BuildSketch(Plane(origin=(0, 4.5, 0), x_dir=(1, 0, 0), z_dir=(0, 1, 0))):
        with Locations((-93.810665852, -30.654521339)):
            Rectangle(SKETCH_20_W, SKETCH_20_H)
    extrude(amount=EXTRUDE_13_DEPTH)

    # Эскиз21 → Бобышка-Вытянуть14 (add)
    with BuildSketch(Plane(origin=(0, 4.5, 0), x_dir=(1, 0, 0), z_dir=(0, 1, 0))):
        with Locations((-93.810665852, -82.714970025)):
            Rectangle(SKETCH_21_W, SKETCH_21_H)
    extrude(amount=EXTRUDE_14_DEPTH)

    # Эскиз22 → Вырез-Вытянуть7 (cut)
    with BuildSketch(Plane(origin=(0, 3, 0), x_dir=(1, 0, 0), z_dir=(0, 1, 0))):
        with Locations(Location((-77.72379646, -80.087862309, 0), (0, 0, 270))):
            Circle(SKETCH_22_R)
    extrude(amount=-CUT_EXTRUDE_7_DEPTH, mode=Mode.SUBTRACT)

    # Эскиз24 → Вырез-Вытянуть8 (cut)
    with BuildSketch(Plane.XY.offset(87.998233291)):
        with Locations((-53.545237887, 34.249539746)):
            Rectangle(SKETCH_24_W, SKETCH_24_H)
    extrude(amount=-CUT_EXTRUDE_8_DEPTH, mode=Mode.SUBTRACT)

    # Фаска7
    chamfer_7_edges = [part.edges().sort_by_distance(p)[0] for p in [
        (-91.8, 26, 97.998233291),
    ]]
    chamfer(chamfer_7_edges, length=CHAMFER_7_SIZE)

    # Croquis1 → Cortar-Extruir1 (cut, through all)
    with BuildSketch(Plane(origin=(0, 0, 0), x_dir=(0, 0, -1), z_dir=(1, 0, 0))):
        Polygon((-84.998233291, 4.5), (-100, 4.5), (-100, 50), (0, 50), (0, 4.5), align=None)
    extrude(amount=-CORTAR_EXTRUIR1_DEPTH, mode=Mode.SUBTRACT)

    # Croquis4 → Saliente-Extruir2 (add)
    with BuildSketch(Plane.XY.offset(100)):
        with Locations((-33.89, 25.11)):
            Rectangle(CROQUIS4_W, CROQUIS4_H)
        with Locations((-33.89, 25.11)):
            Rectangle(CROQUIS4_W_2, CROQUIS4_H_2, mode=Mode.SUBTRACT)
    extrude(amount=SALIENTE_EXTRUIR2_DEPTH)

    # Croquis5 → Saliente-Extruir3 (add)
    with BuildSketch(Plane(origin=(0, 0, 0), x_dir=(0, 0, -1), z_dir=(1, 0, 0))):
        with Locations((-50, 1.25)):
            Rectangle(CROQUIS5_W, CROQUIS5_H)
    extrude(amount=SALIENTE_EXTRUIR3_DEPTH)

    # Croquis10 → Cortar-Extruir2 (cut, through all)
    with BuildSketch(Plane(origin=(0, 4.5, 0), x_dir=(1, 0, 0), z_dir=(0, 1, 0))):
        with Locations((-33.89, -11.964204449)):
            Rectangle(CROQUIS10_W, CROQUIS10_H)
    extrude(amount=-CORTAR_EXTRUIR2_DEPTH, mode=Mode.SUBTRACT)

    # Croquis13 → Saliente-Extruir4 (add, up to next)
    with BuildSketch(Plane.ZY.offset(95), mode=Mode.PRIVATE) as saliente_extruir4_sk1:
        with Locations((24.92254207, 1.25)):
            Rectangle(CROQUIS13_W, CROQUIS13_H)
    saliente_extruir4_tool1 = extrude(saliente_extruir4_sk1.sketch, amount=-SALIENTE_EXTRUIR4_REACH, mode=Mode.PRIVATE) - part.part
    add(saliente_extruir4_tool1.solids().sort_by_distance((-95, 1.25, 24.922542))[0])
    add(saliente_extruir4_tool1.solids().sort_by_distance((-95, 1.25, 24.922542))[1])

    # Croquis14 → Saliente-Extruir5 (add)
    with BuildSketch(Plane(origin=(0, 0, 23.928408898), x_dir=(-1, 0, 0), z_dir=(0, 0, -1))):
        with Locations((33.89, 25.11)):
            Rectangle(CROQUIS14_W, CROQUIS14_H)
    extrude(amount=-SALIENTE_EXTRUIR5_DEPTH)

    # Croquis15 → Saliente-Extruir6 (add)
    with BuildSketch(Plane(origin=(27.22, 0, 0), x_dir=(0, 0, -1), z_dir=(1, 0, 0))):
        with Locations((-63.464204449, 25.11)):
            Rectangle(CROQUIS15_W, CROQUIS15_H)
    extrude(amount=-SALIENTE_EXTRUIR6_DEPTH)

    # Croquis16 → Cortar-Extruir3 (cut, through all)
    with BuildSketch(Plane(origin=(27.22, 0, 0), x_dir=(0, 0, -1), z_dir=(1, 0, 0))):
        with Locations((-63.464204449, 25.11)):
            Circle(CROQUIS16_R)
    extrude(amount=-CORTAR_EXTRUIR3_DEPTH, mode=Mode.SUBTRACT)

    # Croquis18 → Cortar-Extruir4 (cut)
    with BuildSketch(Plane(origin=(0, 52.22, 0), x_dir=(1, 0, 0), z_dir=(0, 1, 0))):
        with Locations((-75.78, -25.428408898)):
            Rectangle(CROQUIS18_W, CROQUIS18_H)
        with Locations((-0.78, -25.428408898)):
            Rectangle(CROQUIS18_W_2, CROQUIS18_H)
        with Locations((-40.78, -25.428408898)):
            Rectangle(CROQUIS18_W_2, CROQUIS18_H)
    cortar_extruir4 = extrude(amount=-CORTAR_EXTRUIR4_DEPTH, mode=Mode.SUBTRACT)

    # Simetría3: Cortar-Extruir4 across plane
    add(cortar_extruir4.mirror(Plane.XY.offset(63.464204449)), mode=Mode.SUBTRACT)

    # Croquis23 → Cortar-Extruir5 (cut)
    with BuildSketch(Plane(origin=(0, 0, 23.928408898), x_dir=(-1, 0, 0), z_dir=(0, 0, -1))):
        with Locations((49.487159882, 20.5)):
            Rectangle(CROQUIS23_W, CROQUIS23_H)
    extrude(amount=-CORTAR_EXTRUIR5_DEPTH, mode=Mode.SUBTRACT)


solid = part.part
